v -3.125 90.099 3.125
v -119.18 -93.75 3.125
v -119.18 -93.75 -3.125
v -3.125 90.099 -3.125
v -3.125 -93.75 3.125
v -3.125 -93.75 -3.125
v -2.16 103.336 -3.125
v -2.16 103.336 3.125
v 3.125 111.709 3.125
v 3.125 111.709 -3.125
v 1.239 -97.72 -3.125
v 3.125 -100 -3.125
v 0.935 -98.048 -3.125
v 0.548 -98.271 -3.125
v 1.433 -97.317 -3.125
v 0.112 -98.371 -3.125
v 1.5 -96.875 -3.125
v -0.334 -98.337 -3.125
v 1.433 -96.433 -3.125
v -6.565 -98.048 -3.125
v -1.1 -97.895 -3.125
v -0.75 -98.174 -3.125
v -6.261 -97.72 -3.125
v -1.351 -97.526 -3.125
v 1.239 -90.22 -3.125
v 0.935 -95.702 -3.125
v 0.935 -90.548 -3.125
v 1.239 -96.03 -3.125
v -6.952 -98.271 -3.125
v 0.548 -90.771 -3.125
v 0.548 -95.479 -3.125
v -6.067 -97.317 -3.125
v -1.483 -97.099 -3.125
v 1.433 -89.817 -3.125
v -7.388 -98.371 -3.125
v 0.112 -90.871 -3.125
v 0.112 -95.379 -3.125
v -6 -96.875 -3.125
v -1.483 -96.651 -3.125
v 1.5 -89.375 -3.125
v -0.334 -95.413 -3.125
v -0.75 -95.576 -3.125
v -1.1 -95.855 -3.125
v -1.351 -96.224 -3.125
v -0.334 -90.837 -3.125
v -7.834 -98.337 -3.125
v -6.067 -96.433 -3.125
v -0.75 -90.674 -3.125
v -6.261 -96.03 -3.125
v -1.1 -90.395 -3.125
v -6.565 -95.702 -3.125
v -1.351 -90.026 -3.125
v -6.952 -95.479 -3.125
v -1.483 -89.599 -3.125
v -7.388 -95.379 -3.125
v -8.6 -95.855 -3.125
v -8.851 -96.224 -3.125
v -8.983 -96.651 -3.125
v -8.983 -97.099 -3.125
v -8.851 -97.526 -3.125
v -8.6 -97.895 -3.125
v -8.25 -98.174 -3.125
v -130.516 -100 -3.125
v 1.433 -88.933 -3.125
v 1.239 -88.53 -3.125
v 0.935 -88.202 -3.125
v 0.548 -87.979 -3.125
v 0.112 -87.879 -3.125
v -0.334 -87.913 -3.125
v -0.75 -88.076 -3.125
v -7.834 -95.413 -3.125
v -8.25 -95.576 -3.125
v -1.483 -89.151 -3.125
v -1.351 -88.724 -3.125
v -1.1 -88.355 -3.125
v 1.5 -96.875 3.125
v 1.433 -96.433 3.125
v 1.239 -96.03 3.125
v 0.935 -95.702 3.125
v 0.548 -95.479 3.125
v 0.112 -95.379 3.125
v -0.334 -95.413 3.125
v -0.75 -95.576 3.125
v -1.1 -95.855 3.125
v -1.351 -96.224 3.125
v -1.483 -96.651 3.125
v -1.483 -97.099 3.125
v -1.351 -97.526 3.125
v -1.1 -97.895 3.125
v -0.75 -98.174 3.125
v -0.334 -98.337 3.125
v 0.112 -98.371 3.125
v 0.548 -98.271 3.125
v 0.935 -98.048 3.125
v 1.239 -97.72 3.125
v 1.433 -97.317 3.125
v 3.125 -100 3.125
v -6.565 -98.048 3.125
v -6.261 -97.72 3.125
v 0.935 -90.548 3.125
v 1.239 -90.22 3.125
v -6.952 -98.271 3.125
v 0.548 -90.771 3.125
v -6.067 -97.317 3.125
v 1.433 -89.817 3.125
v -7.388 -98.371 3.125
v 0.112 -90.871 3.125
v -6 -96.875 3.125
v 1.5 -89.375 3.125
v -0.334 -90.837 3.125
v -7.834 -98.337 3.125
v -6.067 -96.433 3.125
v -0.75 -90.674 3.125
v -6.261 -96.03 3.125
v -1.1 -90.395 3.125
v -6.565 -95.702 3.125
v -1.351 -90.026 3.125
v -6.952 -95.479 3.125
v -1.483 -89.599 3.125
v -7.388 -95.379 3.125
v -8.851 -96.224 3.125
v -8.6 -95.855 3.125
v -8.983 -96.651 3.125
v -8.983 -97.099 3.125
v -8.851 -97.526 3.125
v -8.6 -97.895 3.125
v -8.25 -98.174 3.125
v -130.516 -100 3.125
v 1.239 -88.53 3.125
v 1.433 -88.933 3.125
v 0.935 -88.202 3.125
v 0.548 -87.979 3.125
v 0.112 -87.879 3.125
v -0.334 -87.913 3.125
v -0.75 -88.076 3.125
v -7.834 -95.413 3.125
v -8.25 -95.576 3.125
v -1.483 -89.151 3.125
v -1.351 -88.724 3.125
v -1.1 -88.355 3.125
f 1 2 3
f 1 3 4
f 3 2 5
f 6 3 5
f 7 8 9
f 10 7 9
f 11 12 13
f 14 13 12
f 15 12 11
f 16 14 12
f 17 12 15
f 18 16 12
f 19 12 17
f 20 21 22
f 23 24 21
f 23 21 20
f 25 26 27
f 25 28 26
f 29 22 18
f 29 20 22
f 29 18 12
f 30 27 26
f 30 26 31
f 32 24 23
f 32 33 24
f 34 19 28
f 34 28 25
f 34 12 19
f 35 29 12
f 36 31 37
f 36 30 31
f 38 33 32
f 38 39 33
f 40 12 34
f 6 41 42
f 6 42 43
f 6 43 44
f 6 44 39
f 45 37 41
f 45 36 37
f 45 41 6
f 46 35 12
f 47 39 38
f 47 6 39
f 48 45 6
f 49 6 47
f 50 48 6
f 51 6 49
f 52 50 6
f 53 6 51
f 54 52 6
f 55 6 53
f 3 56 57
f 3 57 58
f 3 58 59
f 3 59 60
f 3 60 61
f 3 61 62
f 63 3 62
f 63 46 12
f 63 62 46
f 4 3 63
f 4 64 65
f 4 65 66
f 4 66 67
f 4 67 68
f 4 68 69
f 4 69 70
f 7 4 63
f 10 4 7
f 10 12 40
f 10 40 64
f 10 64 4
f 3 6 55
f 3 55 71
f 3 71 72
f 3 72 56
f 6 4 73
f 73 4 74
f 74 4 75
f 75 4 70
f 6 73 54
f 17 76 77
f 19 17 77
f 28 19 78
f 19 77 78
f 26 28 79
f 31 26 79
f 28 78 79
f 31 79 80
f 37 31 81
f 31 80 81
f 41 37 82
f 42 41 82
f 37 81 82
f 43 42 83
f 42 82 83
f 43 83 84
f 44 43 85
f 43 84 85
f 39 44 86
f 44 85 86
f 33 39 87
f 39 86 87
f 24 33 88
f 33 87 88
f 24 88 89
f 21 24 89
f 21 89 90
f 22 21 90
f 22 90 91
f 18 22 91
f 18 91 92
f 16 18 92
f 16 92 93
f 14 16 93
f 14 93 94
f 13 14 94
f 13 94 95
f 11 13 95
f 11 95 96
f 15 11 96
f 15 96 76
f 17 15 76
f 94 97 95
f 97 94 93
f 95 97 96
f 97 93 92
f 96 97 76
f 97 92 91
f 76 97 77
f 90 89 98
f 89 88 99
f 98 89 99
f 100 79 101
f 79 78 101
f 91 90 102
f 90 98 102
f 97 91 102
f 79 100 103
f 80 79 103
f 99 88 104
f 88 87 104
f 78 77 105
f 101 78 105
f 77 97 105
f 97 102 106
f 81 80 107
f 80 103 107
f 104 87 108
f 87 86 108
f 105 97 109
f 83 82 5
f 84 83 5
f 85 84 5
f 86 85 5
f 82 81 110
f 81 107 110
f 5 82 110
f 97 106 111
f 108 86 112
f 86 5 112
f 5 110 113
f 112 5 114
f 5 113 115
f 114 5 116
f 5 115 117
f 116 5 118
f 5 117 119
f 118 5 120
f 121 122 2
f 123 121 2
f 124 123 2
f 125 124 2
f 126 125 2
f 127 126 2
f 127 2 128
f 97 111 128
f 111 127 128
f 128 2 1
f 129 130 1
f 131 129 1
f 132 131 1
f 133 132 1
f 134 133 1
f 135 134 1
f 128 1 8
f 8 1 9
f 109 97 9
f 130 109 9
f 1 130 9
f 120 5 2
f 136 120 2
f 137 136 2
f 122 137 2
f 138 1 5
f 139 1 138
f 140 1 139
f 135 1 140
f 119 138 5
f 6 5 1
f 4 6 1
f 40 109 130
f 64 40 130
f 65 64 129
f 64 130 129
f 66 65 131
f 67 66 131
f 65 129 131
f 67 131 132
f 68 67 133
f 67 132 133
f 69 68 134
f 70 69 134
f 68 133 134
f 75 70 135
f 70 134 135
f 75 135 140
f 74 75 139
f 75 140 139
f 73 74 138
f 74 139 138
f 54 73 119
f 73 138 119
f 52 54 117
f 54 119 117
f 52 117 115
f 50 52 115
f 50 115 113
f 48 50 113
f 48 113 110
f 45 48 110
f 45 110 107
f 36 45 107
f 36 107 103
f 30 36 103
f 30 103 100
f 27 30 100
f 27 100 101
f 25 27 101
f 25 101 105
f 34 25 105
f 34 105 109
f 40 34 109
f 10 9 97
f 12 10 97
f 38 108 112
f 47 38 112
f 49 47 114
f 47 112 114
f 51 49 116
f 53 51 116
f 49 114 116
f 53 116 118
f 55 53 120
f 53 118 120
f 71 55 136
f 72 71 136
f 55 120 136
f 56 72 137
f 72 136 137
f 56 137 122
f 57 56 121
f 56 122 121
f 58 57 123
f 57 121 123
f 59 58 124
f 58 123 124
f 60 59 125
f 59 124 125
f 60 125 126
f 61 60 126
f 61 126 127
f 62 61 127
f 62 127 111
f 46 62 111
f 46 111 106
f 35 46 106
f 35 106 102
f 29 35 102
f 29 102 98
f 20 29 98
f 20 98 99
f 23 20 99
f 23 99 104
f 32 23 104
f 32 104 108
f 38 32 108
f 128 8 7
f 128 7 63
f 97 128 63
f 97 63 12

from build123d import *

# Parameters (mm, degrees)
CROQUIS1_W              = 6.25
CROQUIS1_H              = 200
SALIENTE_EXTRUIR1_DEPTH = 3.125
CORTAR_EXTRUIR1_DEPTH   = 6.25
CROQUIS4_W              = 120
CROQUIS4_H              = 6.25
SALIENTE_EXTRUIR2_DEPTH = 6.25
SALIENTE_EXTRUIR3_DEPTH = 6.25
SALIENTE_EXTRUIR4_DEPTH = 6.25
CROQUIS10_R             = 1.5
CORTAR_EXTRUIR3_DEPTH   = 16.25


with BuildPart() as part:
    # Croquis1 → Saliente-Extruir1 (new, symmetric)
    with BuildSketch(Plane.XY):
        Rectangle(CROQUIS1_W, CROQUIS1_H)
    extrude(amount=SALIENTE_EXTRUIR1_DEPTH, both=True)

    # Croquis3 → Cortar-Extruir1 (cut)
    with BuildSketch(Plane.XY.offset(3.125)):
        Polygon((3.125, 100), (-3.125, 93.75), (-3.125, 100), align=None)
    extrude(amount=-CORTAR_EXTRUIR1_DEPTH, mode=Mode.SUBTRACT)

    # Croquis4 → Saliente-Extruir2 (add)
    with BuildSketch(Plane.XY.offset(3.125)):
        with Locations((-63.125, -96.875)):
            Rectangle(CROQUIS4_W, CROQUIS4_H)
    extrude(amount=-SALIENTE_EXTRUIR2_DEPTH)

    # Croquis7 → Saliente-Extruir3 (add)
    with BuildSketch(Plane.XY.offset(3.125)):
        Polygon((-123.125, -100), (3.125, 100), (-2.160090412, 103.336213323), (-130.516075072, -100), align=None)
    extrude(amount=-SALIENTE_EXTRUIR3_DEPTH)

    # Croquis9 → Saliente-Extruir4 (add)
    with BuildSketch(Plane.XY.offset(3.125)):
        Polygon((3.125, 100), (-2.160090412, 103.336213323), (3.125, 111.708633778), align=None)
    extrude(amount=-SALIENTE_EXTRUIR4_DEPTH)

    # Croquis10 → Cortar-Extruir3 (cut)
    with BuildSketch(Plane.XY.offset(3.125)):
        with Locations((0, -96.875)):
            Circle(CROQUIS10_R)
        with Locations((0, -89.375)):
            Circle(CROQUIS10_R)
        with Locations((-7.5, -96.875)):
            Circle(CROQUIS10_R)
    extrude(amount=-CORTAR_EXTRUIR3_DEPTH, mode=Mode.SUBTRACT)


solid = part.part
